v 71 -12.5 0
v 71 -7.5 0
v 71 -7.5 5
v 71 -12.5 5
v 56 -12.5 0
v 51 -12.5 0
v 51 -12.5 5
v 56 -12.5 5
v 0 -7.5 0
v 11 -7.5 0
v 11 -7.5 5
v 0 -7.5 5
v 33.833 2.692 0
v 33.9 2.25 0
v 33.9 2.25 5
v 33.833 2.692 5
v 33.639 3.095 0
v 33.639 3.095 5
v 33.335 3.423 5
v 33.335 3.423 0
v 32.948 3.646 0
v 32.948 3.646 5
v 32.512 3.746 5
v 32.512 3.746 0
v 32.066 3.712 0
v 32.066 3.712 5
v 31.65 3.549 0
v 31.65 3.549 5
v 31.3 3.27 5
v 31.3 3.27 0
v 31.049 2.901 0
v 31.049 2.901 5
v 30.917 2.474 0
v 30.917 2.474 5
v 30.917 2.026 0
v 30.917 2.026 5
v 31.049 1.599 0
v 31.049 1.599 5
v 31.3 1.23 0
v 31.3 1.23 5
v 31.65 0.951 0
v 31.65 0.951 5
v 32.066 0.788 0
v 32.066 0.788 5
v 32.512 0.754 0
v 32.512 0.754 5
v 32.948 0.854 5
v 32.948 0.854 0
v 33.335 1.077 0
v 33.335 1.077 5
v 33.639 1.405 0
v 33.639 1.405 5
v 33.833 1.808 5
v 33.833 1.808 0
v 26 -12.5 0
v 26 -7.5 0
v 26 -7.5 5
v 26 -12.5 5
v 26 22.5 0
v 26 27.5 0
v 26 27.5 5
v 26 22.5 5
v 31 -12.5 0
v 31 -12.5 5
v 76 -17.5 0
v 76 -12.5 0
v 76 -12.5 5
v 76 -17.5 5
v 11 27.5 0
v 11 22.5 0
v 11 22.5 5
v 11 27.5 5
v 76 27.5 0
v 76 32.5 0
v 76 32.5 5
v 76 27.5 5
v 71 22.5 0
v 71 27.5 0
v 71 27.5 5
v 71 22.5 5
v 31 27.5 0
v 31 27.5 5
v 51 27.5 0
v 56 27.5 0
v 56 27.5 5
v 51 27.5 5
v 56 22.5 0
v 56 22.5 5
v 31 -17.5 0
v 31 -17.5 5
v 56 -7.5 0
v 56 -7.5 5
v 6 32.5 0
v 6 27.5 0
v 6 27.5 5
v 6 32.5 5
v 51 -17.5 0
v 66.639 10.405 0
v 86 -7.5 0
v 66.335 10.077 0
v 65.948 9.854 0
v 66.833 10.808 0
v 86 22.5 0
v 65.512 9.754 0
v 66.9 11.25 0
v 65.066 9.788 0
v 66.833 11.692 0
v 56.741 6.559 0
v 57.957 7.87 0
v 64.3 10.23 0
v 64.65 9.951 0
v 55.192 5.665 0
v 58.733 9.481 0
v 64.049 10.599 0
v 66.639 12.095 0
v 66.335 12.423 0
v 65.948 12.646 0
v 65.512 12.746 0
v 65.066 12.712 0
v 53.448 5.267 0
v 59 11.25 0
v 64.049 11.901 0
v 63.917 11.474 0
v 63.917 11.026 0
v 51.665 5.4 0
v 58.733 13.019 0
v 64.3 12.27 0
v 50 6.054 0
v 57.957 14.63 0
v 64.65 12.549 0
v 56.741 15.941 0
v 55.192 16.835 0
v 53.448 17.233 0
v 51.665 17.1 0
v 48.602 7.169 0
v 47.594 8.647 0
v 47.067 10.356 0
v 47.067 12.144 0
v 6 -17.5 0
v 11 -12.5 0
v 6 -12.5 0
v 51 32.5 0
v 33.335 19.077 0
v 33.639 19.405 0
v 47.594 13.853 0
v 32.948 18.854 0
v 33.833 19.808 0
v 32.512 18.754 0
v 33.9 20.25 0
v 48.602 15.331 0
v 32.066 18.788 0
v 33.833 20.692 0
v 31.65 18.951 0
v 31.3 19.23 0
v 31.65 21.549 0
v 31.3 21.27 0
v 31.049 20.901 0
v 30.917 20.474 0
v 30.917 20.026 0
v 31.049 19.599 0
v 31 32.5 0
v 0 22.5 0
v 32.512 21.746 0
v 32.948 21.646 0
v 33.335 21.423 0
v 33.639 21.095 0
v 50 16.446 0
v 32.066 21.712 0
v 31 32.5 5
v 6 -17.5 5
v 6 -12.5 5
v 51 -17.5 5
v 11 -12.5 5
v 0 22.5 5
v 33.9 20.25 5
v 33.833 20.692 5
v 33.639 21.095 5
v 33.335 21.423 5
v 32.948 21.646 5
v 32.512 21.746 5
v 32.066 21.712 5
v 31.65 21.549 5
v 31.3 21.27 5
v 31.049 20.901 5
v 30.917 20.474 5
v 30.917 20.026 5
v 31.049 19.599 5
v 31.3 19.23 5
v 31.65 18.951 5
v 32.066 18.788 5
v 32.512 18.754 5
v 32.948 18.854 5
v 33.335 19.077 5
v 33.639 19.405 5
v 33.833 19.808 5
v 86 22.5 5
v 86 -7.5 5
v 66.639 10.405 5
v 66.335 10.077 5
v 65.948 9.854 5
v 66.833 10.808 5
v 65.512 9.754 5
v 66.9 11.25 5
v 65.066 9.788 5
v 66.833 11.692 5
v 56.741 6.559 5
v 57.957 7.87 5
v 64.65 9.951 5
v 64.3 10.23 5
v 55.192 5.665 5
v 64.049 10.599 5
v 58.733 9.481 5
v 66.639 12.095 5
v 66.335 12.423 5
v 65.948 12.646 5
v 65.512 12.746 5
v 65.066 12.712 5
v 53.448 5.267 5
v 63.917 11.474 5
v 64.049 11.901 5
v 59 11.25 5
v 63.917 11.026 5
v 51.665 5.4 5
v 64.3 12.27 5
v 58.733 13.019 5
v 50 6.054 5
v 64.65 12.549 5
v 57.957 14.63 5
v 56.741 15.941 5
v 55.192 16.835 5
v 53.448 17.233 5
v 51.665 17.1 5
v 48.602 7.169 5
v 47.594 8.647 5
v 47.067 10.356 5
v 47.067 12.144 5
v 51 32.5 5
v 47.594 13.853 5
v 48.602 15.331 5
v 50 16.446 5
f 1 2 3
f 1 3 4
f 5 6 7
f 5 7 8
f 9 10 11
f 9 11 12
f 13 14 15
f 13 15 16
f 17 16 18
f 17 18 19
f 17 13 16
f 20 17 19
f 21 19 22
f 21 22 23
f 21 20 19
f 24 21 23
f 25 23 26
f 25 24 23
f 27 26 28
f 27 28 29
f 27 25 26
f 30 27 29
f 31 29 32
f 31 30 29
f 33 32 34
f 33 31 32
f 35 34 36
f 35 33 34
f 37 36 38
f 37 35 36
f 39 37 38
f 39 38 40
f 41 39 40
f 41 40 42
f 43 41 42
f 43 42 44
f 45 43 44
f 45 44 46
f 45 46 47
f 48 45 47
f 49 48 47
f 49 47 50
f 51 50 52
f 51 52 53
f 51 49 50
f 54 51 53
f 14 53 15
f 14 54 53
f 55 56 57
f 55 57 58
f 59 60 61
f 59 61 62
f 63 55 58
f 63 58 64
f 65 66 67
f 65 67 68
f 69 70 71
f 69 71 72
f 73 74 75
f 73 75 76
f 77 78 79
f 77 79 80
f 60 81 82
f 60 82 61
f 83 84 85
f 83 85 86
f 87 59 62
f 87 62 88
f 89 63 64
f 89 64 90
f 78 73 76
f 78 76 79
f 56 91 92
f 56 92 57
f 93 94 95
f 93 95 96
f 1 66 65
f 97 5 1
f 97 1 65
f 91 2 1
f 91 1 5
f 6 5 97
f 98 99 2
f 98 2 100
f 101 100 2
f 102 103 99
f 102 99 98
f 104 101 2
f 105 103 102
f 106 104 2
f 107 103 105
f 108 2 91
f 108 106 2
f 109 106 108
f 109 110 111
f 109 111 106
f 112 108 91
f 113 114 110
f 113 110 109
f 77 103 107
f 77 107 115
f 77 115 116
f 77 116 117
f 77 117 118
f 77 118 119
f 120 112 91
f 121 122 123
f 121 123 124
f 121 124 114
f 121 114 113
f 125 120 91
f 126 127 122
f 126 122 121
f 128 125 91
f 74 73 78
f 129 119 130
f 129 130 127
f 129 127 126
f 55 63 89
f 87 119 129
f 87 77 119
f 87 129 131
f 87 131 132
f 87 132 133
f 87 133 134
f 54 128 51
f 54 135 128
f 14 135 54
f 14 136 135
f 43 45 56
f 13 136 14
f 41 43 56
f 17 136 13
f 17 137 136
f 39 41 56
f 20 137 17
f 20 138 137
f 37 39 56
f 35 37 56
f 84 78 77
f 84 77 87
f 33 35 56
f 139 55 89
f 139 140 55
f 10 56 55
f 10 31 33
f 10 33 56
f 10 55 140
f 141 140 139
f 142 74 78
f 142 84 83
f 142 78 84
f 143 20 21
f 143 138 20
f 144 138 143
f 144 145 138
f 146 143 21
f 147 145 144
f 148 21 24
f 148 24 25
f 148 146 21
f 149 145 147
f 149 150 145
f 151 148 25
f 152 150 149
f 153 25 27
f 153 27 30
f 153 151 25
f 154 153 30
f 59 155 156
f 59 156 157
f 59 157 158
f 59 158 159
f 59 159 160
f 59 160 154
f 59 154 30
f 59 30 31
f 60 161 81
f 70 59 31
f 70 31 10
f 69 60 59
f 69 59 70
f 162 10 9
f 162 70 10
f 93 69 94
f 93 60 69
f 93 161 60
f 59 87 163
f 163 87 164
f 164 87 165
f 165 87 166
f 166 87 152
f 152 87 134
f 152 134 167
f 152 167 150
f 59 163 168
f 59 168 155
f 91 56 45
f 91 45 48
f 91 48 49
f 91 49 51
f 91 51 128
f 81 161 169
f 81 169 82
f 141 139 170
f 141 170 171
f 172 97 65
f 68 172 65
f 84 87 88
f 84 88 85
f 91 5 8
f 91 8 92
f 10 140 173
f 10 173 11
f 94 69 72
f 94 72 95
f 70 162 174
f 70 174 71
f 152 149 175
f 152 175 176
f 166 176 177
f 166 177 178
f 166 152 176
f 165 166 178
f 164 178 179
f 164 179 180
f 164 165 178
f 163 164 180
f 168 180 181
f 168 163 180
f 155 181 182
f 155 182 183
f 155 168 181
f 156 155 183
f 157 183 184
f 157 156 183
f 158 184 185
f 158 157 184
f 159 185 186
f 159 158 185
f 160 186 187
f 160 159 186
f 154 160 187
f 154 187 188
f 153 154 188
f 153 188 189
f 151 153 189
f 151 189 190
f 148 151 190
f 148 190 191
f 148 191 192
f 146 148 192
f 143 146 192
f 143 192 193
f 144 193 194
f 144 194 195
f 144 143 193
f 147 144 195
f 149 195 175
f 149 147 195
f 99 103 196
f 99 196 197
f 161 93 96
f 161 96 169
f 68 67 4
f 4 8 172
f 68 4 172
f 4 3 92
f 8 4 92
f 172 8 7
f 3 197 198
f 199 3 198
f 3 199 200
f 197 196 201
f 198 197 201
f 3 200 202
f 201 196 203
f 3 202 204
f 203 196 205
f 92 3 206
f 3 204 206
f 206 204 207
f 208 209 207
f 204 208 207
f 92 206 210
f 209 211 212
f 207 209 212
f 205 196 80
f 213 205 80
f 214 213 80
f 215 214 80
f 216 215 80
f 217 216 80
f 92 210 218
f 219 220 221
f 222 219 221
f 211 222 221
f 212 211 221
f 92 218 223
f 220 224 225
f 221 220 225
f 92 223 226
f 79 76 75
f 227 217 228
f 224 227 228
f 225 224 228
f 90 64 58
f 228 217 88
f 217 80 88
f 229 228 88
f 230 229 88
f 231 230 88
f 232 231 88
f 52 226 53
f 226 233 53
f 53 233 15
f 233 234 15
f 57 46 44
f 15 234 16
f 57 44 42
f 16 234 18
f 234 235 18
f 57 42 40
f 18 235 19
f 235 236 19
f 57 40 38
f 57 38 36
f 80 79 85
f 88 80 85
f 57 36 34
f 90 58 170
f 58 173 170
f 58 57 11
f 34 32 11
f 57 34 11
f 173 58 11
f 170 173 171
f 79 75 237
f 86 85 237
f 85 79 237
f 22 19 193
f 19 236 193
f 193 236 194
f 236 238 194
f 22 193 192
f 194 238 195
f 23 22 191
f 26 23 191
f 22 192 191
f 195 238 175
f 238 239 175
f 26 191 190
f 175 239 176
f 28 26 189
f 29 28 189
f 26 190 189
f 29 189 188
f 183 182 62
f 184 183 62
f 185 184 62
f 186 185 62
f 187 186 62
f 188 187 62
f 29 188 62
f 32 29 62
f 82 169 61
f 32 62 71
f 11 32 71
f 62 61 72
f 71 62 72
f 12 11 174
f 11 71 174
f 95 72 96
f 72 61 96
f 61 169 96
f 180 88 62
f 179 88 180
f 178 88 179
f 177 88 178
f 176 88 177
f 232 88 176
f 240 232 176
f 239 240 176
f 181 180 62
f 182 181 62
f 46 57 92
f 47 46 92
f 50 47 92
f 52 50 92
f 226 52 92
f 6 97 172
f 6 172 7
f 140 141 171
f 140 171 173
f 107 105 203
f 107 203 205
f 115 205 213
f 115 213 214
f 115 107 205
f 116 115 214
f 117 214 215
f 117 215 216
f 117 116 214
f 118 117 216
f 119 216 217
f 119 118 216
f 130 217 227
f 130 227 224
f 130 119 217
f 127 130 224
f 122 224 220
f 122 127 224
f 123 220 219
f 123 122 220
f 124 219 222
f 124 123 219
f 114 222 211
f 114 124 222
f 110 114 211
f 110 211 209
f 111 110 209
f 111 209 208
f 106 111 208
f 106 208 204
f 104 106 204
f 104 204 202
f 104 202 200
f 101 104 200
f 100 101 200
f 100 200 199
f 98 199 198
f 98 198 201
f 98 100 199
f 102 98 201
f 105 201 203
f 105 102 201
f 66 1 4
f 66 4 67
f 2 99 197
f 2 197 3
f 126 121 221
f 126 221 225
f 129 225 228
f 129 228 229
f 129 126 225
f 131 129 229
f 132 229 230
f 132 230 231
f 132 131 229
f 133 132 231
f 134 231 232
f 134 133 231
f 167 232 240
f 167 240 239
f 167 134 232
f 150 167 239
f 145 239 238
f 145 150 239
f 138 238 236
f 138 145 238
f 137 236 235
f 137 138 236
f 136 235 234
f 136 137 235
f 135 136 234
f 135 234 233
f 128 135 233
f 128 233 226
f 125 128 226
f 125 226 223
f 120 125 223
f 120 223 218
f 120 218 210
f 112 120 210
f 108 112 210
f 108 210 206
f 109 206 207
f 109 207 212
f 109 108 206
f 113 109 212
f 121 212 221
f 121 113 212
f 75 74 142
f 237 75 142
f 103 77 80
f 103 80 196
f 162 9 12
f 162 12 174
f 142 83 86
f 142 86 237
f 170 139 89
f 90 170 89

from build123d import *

# Parameters (mm, degrees)
SKETCH1_R           = 1.5
SKETCH1_R_2         = 6
BOSS_EXTRUDE1_DEPTH = 5


with BuildPart() as part:
    # Sketch1 → Boss-Extrude1 (new body)
    with BuildSketch(Plane.XY):
        Polygon((11, 27.5), (6, 27.5), (6, 32.5), (31, 32.5), (31, 27.5), (26, 27.5), (26, 22.5), (56, 22.5), (56, 27.5), (51, 27.5), (51, 32.5), (56, 32.5), (71, 32.5), (76, 32.5), (76, 27.5), (71, 27.5), (71, 22.5), (86, 22.5), (86, -7.5), (71, -7.5), (71, -12.5), (76, -12.5), (76, -17.5), (71, -17.5), (56, -17.5), (51, -17.5), (51, -12.5), (56, -12.5), (56, -7.5), (26, -7.5), (26, -12.5), (31, -12.5), (31, -17.5), (26, -17.5), (11, -17.5), (6, -17.5), (6, -12.5), (11, -12.5), (11, -7.5), (0, -7.5), (0, 22.5), (11, 22.5), align=None)
        with Locations((32.4, 20.25)):
            Circle(SKETCH1_R, mode=Mode.SUBTRACT)
        with Locations((32.4, 2.25)):
            Circle(SKETCH1_R, mode=Mode.SUBTRACT)
        with Locations((53, 11.25)):
            Circle(SKETCH1_R_2, mode=Mode.SUBTRACT)
        with Locations((65.4, 11.25)):
            Circle(SKETCH1_R, mode=Mode.SUBTRACT)
    extrude(amount=BOSS_EXTRUDE1_DEPTH)


solid = part.part
